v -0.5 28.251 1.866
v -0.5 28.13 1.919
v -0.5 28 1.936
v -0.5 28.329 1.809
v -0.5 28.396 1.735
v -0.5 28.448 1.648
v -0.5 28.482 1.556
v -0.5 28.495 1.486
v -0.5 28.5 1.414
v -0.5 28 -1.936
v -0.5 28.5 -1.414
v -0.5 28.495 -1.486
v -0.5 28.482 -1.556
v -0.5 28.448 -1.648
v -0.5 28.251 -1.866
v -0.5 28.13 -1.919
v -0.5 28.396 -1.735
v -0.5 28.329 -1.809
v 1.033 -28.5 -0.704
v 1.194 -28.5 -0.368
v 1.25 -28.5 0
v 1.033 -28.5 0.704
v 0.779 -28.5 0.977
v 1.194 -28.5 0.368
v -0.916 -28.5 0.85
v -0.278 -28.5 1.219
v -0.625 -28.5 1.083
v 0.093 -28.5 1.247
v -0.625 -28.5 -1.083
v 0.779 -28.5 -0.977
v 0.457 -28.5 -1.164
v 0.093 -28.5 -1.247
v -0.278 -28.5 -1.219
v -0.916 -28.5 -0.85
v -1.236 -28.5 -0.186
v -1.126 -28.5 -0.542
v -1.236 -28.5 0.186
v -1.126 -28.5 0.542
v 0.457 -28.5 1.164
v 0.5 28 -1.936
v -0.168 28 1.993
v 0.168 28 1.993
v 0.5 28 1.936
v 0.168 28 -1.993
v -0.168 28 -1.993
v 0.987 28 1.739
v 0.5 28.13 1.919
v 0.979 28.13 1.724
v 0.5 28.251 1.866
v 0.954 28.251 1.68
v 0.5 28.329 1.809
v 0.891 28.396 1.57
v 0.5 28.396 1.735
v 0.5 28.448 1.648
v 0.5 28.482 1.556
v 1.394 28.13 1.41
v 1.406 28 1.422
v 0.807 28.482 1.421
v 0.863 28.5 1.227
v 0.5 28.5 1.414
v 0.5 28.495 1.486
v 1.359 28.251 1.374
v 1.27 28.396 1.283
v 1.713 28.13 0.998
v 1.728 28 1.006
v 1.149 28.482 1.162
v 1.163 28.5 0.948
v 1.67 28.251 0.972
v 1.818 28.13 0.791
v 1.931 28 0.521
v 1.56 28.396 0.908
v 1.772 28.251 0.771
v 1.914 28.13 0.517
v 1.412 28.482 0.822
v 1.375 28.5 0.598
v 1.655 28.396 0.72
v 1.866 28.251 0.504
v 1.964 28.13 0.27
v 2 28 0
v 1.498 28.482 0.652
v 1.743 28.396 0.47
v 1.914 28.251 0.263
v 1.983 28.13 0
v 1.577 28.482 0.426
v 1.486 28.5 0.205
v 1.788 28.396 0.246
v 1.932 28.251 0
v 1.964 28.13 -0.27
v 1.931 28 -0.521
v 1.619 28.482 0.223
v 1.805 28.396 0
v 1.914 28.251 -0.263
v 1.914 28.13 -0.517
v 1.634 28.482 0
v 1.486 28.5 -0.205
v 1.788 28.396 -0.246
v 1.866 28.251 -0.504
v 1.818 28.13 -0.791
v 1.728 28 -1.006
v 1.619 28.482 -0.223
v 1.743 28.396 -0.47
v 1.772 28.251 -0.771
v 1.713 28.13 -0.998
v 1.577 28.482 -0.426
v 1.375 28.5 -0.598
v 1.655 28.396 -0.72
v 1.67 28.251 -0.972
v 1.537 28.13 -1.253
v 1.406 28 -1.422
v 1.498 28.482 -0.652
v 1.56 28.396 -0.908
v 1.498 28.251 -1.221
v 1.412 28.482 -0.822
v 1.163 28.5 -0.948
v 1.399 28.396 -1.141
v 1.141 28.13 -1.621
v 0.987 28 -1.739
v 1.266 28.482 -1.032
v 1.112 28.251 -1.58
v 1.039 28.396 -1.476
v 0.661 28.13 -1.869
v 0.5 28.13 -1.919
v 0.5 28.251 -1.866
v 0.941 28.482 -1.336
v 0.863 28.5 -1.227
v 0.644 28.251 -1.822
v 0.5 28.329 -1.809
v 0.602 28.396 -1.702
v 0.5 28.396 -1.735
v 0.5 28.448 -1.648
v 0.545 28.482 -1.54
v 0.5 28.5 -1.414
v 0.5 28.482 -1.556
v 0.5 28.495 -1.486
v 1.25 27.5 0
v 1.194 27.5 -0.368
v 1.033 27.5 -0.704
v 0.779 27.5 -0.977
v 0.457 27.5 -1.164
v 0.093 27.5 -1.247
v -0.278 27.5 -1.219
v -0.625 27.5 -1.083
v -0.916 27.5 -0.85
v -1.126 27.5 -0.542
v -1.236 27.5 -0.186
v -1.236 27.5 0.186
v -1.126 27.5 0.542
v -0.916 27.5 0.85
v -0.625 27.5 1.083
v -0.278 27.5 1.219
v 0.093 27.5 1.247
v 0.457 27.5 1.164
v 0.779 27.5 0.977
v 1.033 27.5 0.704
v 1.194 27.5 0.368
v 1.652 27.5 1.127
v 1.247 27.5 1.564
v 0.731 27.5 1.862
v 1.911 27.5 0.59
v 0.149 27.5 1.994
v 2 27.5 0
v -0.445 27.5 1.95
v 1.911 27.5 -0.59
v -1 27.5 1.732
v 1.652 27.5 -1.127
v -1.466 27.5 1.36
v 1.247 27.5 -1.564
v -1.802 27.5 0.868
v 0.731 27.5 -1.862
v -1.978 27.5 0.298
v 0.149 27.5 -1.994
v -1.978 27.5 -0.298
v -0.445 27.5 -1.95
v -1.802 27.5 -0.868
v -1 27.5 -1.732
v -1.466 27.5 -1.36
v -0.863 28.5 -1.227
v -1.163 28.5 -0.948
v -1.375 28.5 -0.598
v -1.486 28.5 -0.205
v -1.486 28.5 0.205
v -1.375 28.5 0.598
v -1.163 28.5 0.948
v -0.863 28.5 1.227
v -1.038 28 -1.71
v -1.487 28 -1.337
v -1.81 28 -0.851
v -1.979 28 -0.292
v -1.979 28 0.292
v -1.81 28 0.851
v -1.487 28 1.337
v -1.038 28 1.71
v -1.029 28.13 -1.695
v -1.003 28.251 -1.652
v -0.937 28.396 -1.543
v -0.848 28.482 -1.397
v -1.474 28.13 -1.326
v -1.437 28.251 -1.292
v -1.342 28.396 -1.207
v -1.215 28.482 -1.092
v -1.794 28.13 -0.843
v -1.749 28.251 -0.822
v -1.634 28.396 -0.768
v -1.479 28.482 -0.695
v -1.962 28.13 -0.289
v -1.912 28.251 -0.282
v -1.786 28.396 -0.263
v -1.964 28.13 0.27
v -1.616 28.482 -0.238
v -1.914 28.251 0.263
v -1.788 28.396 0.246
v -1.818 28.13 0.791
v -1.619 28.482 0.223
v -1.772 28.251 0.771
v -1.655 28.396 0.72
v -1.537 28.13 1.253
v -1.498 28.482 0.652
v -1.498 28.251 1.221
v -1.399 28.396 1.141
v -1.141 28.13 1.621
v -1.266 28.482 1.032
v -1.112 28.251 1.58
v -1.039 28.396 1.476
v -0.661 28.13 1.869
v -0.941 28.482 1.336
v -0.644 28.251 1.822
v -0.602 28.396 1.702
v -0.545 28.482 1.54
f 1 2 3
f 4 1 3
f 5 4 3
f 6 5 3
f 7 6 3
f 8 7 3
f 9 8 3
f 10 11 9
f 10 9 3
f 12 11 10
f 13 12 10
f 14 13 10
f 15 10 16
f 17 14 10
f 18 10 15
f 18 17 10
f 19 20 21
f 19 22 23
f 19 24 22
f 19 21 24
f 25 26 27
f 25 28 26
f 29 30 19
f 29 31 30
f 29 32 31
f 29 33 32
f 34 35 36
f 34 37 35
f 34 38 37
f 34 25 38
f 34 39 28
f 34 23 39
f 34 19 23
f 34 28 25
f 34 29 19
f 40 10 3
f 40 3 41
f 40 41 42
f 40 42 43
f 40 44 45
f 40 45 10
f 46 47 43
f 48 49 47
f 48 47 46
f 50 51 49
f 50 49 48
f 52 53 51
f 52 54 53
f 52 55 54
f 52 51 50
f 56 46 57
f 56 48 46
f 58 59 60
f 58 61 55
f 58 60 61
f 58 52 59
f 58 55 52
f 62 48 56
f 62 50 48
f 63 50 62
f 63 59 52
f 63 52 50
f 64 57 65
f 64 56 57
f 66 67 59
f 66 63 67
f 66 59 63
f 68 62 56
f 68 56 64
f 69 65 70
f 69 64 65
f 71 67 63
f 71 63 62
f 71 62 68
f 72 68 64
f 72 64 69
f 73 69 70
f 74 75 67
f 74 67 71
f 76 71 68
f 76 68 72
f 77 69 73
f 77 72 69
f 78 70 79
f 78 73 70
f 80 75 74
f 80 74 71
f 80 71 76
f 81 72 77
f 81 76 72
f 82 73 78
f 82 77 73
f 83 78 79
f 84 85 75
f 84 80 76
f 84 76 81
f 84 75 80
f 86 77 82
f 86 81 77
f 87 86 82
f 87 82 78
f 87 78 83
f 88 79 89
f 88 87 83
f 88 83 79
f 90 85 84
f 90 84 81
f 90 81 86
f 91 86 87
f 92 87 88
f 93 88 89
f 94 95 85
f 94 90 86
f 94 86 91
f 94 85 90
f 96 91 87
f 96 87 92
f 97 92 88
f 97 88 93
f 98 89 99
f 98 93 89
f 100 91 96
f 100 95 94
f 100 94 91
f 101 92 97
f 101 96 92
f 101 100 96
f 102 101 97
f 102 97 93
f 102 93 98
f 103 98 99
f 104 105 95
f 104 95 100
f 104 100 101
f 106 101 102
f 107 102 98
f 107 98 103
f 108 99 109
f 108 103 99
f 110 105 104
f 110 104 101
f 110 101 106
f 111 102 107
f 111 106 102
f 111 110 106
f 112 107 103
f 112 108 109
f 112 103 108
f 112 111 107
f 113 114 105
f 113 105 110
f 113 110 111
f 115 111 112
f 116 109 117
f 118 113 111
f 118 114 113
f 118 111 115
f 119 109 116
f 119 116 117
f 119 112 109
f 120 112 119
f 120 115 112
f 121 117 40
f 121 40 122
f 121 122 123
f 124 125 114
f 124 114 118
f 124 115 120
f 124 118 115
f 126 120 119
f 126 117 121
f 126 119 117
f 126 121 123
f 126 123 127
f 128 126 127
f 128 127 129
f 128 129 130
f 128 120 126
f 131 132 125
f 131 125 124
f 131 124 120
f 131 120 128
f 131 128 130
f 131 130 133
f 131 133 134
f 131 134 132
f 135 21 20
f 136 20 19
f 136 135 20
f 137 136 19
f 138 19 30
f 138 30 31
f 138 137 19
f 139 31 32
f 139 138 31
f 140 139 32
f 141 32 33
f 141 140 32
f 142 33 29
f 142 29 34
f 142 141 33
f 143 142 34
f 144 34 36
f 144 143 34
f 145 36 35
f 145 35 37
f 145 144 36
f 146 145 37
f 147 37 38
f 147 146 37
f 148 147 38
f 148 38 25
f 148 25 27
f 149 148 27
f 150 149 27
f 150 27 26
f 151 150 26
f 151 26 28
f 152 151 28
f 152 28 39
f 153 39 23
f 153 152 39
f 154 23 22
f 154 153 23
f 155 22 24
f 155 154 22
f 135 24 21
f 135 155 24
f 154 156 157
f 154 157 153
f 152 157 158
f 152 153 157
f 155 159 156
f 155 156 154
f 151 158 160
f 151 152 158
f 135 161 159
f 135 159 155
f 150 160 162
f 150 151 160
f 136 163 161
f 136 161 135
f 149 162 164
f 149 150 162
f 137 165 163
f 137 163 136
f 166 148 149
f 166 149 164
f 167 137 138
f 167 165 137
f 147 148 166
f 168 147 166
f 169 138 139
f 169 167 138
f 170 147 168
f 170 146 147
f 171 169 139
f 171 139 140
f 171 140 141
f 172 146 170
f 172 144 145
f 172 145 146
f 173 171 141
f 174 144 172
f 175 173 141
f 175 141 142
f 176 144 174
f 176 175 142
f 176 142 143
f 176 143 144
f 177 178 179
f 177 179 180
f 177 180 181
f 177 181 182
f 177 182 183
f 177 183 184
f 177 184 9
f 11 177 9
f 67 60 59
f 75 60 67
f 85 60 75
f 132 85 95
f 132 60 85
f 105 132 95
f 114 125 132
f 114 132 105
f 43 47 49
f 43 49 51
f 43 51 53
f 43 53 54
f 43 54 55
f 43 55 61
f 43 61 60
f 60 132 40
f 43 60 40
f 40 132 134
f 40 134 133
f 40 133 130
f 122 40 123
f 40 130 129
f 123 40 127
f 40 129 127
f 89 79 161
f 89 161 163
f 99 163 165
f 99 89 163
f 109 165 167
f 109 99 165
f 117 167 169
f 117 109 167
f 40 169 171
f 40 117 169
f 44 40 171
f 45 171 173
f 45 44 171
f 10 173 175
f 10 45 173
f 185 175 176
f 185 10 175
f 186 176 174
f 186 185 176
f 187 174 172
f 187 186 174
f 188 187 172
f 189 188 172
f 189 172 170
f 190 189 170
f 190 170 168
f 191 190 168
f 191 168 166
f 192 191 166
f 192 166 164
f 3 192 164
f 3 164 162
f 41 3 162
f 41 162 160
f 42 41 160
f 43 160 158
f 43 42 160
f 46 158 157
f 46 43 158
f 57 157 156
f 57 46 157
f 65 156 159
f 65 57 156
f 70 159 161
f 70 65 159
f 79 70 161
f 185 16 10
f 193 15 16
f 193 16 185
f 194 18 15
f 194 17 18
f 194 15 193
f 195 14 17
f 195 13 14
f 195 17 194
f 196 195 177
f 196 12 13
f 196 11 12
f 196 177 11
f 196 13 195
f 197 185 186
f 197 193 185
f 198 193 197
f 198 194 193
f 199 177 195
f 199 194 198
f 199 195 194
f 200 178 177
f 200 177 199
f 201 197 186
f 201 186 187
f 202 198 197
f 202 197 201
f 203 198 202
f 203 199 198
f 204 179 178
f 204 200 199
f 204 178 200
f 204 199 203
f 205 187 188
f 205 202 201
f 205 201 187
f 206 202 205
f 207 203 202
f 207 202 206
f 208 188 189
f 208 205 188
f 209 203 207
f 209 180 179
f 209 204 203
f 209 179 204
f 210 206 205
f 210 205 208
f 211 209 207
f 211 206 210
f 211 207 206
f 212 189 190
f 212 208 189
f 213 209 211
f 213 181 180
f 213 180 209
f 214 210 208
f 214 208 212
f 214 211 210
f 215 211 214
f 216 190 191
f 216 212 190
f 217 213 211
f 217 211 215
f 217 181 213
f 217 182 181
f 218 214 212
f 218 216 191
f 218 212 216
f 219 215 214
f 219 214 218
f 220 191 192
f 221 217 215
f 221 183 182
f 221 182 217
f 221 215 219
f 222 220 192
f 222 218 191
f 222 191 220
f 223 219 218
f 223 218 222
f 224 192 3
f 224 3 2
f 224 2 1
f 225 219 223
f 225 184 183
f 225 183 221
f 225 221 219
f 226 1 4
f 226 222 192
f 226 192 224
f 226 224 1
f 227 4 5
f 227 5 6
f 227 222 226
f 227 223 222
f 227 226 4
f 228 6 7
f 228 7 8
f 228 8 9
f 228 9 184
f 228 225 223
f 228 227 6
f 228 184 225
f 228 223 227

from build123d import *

# Parameters (mm, degrees)
SKETCH2_W          = 1
SKETCH2_H          = 8
CUT_EXTRUDE1_DEPTH = 0.5


with BuildPart() as part:
    # Sketch1 → Revolve1 (revolve)
    with BuildSketch(Plane.XY):
        with BuildLine():
            Line((0, -28.5), (1.25, -28.5))
            Line((1.25, -28.5), (1.25, 27.5))
            Line((1.25, 27.5), (2, 27.5))
            Line((2, 27.5), (2, 28))
            ThreePointArc((2, 28), (1.853553391, 28.353553391), (1.5, 28.5))
            Line((1.5, 28.5), (0, 28.5))
            Line((0, 28.5), (0, -28.5))
        make_face()
    revolve(axis=Axis((0, -28.5, 0), (0, 1, 0)))

    # Sketch2 → Cut-Extrude1 (cut)
    with BuildSketch(Plane(origin=(0, 28.5, 0), x_dir=(1, 0, 0), z_dir=(0, 1, 0))):
        Rectangle(SKETCH2_W, SKETCH2_H)
    extrude(amount=-CUT_EXTRUDE1_DEPTH, mode=Mode.SUBTRACT)


solid = part.part
